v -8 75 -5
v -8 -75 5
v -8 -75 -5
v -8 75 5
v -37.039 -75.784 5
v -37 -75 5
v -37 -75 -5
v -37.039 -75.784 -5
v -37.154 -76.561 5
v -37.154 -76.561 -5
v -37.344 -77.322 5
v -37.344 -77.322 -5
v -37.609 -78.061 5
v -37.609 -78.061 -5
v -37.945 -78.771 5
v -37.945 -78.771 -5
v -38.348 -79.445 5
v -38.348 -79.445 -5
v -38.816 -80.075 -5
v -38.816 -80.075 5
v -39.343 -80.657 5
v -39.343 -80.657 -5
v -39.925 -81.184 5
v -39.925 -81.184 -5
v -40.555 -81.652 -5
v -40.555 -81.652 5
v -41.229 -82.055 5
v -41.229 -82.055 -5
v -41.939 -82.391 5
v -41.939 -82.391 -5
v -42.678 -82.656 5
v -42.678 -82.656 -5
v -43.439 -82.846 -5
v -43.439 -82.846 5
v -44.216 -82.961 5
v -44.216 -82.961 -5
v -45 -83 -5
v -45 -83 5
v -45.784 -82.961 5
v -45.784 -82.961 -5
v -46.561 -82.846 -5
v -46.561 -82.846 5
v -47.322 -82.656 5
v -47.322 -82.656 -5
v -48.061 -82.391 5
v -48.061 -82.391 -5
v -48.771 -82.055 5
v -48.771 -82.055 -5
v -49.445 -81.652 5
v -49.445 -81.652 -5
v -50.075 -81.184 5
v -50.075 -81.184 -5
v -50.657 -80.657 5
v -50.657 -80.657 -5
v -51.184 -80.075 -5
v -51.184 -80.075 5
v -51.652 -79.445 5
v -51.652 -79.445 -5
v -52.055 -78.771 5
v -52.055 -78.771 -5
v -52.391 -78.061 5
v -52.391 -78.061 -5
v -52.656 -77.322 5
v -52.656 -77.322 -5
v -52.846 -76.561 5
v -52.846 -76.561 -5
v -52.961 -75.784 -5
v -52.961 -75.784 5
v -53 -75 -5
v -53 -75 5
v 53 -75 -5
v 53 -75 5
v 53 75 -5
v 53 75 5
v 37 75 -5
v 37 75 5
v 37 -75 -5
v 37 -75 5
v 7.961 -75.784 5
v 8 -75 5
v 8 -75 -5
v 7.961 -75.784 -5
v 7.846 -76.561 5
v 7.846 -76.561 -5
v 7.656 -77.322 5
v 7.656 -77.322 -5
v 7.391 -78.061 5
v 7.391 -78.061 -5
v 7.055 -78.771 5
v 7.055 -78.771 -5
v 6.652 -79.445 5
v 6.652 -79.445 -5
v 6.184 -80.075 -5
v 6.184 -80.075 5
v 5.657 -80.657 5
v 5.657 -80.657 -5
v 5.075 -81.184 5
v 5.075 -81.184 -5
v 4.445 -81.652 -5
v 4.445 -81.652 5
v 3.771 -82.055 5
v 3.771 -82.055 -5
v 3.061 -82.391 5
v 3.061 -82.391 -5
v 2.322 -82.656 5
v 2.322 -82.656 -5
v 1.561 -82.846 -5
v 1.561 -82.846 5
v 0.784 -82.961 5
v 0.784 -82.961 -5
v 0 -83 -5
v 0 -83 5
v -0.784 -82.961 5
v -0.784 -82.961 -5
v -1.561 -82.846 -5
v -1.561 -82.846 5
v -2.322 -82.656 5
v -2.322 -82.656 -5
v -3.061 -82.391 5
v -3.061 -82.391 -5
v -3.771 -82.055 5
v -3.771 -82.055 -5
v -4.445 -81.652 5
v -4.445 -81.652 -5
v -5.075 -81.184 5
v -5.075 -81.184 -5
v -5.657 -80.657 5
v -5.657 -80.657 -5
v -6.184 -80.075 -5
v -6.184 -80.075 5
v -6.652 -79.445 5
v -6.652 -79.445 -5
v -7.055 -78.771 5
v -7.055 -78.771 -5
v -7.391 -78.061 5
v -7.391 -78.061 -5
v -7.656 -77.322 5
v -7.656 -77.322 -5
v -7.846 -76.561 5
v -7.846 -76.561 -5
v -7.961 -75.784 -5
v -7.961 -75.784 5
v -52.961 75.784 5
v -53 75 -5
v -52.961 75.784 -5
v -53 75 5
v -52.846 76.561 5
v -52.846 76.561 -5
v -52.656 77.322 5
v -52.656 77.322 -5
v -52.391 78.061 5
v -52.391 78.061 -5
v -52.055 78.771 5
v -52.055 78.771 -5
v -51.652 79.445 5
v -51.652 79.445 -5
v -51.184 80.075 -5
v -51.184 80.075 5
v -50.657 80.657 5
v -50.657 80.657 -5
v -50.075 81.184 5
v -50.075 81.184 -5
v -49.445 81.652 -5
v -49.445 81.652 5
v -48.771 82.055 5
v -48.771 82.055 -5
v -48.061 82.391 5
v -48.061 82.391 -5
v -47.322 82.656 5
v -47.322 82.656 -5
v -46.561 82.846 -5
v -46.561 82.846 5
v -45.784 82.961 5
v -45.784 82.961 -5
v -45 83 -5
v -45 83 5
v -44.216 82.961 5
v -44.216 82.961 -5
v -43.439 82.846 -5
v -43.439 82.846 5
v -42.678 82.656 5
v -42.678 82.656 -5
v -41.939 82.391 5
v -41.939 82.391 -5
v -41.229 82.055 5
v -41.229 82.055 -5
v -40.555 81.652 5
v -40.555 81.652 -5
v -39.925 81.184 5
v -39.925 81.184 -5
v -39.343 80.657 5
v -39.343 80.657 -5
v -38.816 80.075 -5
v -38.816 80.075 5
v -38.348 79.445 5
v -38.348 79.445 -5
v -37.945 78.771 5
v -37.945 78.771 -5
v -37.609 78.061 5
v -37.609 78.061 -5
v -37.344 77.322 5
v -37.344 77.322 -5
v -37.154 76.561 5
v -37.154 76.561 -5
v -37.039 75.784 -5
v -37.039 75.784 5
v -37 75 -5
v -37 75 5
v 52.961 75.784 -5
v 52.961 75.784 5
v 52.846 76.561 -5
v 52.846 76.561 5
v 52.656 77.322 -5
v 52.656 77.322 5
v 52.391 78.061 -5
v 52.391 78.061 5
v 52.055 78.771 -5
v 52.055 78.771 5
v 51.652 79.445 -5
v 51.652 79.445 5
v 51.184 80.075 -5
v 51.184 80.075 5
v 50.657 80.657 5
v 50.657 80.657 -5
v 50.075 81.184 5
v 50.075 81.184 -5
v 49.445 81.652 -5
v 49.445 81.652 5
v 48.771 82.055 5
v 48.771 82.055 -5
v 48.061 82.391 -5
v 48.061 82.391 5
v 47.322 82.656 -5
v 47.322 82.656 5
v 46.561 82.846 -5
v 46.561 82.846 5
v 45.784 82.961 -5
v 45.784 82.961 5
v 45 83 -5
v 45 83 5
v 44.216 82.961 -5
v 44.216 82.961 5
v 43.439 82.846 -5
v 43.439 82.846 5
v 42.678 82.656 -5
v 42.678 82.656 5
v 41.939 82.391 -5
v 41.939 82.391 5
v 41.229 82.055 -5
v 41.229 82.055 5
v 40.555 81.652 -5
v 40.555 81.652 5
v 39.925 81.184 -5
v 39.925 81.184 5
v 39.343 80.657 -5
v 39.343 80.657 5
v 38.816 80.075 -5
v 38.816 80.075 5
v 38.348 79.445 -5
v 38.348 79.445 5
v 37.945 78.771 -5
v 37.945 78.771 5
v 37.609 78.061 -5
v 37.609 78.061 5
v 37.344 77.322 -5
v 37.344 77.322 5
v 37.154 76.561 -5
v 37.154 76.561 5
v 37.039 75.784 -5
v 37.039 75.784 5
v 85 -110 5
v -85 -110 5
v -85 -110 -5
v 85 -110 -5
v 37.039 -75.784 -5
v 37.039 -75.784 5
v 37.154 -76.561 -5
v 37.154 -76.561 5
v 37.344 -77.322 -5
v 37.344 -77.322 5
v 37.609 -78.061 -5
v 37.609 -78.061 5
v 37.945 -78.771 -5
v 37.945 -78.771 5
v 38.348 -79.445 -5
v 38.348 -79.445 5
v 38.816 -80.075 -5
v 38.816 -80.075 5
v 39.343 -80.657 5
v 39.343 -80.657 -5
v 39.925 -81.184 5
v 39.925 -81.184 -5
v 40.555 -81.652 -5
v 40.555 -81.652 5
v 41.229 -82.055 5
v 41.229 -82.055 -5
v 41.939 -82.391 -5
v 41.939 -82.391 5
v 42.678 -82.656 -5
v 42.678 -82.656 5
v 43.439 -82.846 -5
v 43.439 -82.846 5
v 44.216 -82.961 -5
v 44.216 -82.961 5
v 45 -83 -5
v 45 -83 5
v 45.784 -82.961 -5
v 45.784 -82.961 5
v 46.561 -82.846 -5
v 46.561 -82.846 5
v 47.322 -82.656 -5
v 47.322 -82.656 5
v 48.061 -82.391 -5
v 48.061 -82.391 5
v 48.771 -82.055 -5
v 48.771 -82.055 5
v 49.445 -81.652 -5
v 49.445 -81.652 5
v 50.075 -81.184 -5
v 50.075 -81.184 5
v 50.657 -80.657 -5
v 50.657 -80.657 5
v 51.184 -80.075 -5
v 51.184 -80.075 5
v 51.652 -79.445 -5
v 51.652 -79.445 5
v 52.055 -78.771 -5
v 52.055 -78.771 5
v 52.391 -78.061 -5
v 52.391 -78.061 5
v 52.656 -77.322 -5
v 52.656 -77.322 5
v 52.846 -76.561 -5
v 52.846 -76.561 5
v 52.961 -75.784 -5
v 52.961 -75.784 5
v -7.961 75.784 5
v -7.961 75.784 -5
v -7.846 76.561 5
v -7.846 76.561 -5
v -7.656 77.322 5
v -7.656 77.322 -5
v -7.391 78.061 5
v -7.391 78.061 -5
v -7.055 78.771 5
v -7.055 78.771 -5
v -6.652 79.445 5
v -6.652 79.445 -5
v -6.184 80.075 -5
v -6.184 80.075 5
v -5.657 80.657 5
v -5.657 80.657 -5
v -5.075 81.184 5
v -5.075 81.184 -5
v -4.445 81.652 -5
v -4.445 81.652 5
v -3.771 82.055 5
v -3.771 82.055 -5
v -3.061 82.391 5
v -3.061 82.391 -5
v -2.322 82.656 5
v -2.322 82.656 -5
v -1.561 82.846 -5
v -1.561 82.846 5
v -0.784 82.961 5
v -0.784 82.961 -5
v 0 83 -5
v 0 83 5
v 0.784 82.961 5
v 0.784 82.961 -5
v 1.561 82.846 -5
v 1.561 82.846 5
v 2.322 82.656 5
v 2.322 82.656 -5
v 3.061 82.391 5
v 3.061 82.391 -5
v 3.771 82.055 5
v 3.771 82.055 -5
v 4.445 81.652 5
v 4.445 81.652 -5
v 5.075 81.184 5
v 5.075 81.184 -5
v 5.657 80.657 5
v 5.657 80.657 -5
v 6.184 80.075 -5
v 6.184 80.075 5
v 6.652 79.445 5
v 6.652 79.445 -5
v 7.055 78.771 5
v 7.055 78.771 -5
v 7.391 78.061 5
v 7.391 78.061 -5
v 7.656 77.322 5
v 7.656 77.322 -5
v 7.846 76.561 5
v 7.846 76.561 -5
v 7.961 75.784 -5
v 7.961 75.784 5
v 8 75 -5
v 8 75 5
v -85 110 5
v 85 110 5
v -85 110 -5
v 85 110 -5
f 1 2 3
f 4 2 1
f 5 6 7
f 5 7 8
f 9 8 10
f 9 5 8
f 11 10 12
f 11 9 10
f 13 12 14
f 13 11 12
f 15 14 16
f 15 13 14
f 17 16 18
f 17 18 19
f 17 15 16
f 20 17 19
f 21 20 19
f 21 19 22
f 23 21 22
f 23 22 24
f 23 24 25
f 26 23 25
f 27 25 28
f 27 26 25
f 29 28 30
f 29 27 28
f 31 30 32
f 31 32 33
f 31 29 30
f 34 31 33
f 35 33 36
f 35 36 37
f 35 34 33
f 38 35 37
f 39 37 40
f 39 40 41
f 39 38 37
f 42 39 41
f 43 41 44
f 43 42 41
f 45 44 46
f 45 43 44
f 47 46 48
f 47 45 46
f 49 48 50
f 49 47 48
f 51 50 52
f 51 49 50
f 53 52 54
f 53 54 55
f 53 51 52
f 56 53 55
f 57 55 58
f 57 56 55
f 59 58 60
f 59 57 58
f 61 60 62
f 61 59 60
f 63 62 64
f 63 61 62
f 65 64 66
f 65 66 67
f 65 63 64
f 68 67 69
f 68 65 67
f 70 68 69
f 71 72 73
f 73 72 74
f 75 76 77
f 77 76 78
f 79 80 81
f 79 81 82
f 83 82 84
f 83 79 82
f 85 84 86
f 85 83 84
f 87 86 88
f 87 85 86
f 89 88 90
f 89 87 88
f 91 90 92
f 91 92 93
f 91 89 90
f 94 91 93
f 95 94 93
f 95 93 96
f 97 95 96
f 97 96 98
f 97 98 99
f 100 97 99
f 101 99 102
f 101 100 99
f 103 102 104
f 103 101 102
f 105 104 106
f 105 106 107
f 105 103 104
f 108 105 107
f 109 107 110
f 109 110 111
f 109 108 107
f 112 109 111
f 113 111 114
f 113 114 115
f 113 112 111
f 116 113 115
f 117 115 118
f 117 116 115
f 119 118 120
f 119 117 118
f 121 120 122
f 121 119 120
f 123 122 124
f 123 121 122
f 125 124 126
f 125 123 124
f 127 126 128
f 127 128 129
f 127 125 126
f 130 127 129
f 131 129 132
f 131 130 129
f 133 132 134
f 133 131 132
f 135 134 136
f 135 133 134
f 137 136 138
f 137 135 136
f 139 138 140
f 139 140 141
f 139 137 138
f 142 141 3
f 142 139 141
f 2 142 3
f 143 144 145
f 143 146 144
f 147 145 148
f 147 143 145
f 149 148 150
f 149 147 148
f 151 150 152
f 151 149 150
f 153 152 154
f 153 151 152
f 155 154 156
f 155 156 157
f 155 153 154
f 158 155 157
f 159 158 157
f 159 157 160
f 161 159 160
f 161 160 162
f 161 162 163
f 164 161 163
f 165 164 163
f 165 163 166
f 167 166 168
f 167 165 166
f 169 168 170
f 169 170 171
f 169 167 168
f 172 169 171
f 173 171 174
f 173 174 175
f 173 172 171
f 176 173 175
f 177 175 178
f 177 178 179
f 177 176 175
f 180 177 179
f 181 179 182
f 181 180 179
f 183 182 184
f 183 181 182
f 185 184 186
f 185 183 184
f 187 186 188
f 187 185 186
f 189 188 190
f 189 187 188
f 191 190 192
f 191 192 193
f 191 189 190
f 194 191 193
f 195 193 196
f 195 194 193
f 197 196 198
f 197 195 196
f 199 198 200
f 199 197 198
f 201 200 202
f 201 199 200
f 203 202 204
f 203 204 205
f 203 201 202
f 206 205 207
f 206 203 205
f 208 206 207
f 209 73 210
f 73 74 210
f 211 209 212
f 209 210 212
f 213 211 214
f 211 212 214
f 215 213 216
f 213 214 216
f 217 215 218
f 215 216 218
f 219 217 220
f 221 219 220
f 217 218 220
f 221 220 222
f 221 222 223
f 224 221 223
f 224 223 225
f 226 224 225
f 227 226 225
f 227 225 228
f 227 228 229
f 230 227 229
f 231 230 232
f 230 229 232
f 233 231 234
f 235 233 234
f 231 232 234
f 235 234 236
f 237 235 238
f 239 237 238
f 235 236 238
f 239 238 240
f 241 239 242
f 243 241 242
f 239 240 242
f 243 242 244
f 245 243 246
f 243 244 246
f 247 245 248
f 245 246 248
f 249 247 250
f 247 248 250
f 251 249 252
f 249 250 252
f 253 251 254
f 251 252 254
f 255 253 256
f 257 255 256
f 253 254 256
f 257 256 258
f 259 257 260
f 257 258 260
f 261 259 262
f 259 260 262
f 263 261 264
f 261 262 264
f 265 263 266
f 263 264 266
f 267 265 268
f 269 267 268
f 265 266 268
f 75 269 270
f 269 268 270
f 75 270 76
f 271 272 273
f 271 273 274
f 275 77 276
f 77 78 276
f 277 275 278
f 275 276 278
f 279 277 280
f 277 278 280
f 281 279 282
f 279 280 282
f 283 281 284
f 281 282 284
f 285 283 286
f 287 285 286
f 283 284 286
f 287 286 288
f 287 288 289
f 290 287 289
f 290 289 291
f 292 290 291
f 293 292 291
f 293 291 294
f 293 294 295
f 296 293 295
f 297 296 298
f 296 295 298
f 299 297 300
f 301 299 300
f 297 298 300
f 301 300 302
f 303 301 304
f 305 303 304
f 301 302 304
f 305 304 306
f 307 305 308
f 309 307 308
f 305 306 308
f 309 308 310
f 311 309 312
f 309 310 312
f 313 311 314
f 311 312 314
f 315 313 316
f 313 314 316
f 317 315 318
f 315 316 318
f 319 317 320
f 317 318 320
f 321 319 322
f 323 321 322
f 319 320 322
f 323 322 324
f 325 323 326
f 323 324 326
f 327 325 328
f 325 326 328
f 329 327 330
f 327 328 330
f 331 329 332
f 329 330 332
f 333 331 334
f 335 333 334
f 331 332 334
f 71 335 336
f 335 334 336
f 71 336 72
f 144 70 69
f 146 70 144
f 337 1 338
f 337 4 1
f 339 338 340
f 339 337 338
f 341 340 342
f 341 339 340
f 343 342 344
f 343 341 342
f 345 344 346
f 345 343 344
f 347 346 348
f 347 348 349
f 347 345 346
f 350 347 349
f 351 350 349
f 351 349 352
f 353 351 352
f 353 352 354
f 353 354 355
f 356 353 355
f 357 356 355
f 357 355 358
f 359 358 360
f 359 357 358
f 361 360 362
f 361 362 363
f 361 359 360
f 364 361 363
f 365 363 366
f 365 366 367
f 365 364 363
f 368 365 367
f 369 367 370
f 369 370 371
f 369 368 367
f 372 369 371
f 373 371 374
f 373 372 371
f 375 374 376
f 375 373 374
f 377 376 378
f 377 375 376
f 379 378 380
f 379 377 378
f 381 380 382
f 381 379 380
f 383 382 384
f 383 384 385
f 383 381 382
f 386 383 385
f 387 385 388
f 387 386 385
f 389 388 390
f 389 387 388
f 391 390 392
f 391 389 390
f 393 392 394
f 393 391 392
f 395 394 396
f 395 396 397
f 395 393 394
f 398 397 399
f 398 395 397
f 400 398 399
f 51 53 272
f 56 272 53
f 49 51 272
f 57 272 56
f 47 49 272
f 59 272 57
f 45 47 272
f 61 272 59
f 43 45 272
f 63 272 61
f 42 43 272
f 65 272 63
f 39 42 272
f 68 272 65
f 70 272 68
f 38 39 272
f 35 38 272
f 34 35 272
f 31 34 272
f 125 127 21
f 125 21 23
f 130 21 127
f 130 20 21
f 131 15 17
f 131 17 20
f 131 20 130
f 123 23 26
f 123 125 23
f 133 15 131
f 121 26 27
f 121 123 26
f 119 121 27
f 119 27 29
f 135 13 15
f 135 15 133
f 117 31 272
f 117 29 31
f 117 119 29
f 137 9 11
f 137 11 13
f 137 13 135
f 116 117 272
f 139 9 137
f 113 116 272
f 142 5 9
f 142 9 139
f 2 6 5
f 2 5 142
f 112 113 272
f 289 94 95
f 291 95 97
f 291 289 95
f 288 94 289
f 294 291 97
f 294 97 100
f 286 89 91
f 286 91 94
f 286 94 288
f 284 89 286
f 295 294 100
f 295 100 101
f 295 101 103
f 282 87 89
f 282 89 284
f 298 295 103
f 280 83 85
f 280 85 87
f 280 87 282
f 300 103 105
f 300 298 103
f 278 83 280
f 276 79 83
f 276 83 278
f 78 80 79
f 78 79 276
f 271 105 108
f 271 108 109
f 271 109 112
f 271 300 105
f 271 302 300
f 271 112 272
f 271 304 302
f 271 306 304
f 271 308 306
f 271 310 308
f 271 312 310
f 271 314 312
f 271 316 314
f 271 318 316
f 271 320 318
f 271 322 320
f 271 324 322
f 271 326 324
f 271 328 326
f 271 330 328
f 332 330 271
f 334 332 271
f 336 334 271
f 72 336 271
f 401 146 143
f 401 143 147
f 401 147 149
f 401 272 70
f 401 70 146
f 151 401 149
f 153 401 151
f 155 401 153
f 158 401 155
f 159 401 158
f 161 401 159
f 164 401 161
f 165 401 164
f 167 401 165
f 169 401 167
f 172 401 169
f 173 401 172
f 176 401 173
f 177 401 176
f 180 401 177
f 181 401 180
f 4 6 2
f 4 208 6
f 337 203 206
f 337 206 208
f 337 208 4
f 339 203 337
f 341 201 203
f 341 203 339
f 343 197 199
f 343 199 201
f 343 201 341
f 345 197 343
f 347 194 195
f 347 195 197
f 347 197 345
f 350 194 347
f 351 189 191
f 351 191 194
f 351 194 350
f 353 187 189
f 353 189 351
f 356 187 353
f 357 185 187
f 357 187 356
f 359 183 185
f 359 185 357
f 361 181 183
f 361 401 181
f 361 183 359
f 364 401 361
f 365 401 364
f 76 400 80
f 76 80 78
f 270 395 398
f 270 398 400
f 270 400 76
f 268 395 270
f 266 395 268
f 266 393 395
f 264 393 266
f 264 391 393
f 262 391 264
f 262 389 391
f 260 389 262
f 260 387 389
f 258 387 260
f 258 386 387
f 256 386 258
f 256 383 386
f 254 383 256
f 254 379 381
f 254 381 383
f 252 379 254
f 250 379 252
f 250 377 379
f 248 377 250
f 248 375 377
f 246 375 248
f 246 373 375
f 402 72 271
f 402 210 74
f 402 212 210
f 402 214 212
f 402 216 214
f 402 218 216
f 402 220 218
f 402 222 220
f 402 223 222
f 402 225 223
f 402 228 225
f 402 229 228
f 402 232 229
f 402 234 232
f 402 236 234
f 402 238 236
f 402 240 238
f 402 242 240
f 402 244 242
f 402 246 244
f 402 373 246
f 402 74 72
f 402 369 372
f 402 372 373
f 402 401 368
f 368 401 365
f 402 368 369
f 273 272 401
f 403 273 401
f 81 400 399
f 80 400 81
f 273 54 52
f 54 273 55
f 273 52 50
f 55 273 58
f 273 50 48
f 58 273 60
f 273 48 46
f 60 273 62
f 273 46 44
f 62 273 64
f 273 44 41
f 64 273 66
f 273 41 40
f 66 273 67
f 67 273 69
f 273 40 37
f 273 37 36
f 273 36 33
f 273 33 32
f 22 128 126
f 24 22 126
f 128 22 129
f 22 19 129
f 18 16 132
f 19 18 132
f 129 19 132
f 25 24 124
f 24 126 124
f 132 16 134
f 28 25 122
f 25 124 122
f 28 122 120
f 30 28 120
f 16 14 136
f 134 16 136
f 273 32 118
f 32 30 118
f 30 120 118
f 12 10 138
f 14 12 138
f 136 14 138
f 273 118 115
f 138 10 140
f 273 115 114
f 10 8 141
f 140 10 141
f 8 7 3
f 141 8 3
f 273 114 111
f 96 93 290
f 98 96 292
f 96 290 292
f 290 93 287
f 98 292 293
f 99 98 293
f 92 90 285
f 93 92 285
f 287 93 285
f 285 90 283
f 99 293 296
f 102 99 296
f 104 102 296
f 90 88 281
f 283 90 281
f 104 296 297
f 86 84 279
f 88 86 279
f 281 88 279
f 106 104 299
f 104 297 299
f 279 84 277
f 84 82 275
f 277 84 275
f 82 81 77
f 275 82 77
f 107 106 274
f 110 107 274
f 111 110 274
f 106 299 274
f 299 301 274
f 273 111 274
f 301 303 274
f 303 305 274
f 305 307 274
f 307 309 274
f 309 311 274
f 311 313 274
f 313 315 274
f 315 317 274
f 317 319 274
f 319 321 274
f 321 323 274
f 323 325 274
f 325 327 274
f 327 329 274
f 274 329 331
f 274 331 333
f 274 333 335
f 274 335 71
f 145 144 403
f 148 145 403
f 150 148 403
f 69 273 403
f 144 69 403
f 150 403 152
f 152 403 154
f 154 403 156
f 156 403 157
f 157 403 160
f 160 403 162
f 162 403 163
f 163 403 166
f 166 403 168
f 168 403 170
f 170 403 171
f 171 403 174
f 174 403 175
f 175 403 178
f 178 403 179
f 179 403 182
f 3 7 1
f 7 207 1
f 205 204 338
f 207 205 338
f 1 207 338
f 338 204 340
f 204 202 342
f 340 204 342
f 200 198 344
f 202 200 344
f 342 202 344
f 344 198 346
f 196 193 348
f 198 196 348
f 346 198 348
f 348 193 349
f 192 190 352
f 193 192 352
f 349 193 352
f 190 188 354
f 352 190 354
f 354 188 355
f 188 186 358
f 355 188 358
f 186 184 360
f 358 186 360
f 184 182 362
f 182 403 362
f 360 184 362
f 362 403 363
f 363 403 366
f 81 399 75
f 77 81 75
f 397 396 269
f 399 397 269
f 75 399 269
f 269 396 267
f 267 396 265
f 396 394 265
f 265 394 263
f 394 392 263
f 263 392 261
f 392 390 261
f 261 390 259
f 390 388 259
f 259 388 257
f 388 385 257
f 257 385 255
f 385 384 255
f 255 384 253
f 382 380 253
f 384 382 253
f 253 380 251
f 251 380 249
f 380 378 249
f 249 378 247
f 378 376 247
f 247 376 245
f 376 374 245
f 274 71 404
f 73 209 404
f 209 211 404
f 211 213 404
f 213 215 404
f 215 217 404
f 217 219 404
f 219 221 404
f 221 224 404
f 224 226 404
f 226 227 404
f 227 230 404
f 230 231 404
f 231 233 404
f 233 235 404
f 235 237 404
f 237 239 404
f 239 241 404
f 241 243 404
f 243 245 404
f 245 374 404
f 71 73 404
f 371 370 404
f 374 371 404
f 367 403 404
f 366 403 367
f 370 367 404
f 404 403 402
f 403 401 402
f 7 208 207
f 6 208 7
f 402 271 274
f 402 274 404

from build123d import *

# Parameters (mm, degrees)
SKETCH3_W           = 170
SKETCH3_H           = 220
BOSS_EXTRUDE1_DEPTH = 5


with BuildPart() as part:
    # Sketch3 → Boss-Extrude1 (new, symmetric)
    with BuildSketch(Plane.XY):
        Rectangle(SKETCH3_W, SKETCH3_H)
        with BuildLine():
            Line((8, 75), (8, -75))
            ThreePointArc((8, -75), (0, -83), (-8, -75))
            Line((-8, -75), (-8, 75))
            ThreePointArc((-8, 75), (0, 83), (8, 75))
        make_face(mode=Mode.SUBTRACT)
        with BuildLine():
            Line((-37, 75), (-37, -75))
            ThreePointArc((-37, -75), (-45, -83), (-53, -75))
            Line((-53, -75), (-53, 75))
            ThreePointArc((-53, 75), (-45, 83), (-37, 75))
        make_face(mode=Mode.SUBTRACT)
        with BuildLine():
            Line((37, 75), (37, -75))
            ThreePointArc((37, -75), (45, -83), (53, -75))
            Line((53, -75), (53, 75))
            ThreePointArc((53, 75), (45, 83), (37, 75))
        make_face(mode=Mode.SUBTRACT)
    extrude(amount=BOSS_EXTRUDE1_DEPTH, both=True)


solid = part.part
